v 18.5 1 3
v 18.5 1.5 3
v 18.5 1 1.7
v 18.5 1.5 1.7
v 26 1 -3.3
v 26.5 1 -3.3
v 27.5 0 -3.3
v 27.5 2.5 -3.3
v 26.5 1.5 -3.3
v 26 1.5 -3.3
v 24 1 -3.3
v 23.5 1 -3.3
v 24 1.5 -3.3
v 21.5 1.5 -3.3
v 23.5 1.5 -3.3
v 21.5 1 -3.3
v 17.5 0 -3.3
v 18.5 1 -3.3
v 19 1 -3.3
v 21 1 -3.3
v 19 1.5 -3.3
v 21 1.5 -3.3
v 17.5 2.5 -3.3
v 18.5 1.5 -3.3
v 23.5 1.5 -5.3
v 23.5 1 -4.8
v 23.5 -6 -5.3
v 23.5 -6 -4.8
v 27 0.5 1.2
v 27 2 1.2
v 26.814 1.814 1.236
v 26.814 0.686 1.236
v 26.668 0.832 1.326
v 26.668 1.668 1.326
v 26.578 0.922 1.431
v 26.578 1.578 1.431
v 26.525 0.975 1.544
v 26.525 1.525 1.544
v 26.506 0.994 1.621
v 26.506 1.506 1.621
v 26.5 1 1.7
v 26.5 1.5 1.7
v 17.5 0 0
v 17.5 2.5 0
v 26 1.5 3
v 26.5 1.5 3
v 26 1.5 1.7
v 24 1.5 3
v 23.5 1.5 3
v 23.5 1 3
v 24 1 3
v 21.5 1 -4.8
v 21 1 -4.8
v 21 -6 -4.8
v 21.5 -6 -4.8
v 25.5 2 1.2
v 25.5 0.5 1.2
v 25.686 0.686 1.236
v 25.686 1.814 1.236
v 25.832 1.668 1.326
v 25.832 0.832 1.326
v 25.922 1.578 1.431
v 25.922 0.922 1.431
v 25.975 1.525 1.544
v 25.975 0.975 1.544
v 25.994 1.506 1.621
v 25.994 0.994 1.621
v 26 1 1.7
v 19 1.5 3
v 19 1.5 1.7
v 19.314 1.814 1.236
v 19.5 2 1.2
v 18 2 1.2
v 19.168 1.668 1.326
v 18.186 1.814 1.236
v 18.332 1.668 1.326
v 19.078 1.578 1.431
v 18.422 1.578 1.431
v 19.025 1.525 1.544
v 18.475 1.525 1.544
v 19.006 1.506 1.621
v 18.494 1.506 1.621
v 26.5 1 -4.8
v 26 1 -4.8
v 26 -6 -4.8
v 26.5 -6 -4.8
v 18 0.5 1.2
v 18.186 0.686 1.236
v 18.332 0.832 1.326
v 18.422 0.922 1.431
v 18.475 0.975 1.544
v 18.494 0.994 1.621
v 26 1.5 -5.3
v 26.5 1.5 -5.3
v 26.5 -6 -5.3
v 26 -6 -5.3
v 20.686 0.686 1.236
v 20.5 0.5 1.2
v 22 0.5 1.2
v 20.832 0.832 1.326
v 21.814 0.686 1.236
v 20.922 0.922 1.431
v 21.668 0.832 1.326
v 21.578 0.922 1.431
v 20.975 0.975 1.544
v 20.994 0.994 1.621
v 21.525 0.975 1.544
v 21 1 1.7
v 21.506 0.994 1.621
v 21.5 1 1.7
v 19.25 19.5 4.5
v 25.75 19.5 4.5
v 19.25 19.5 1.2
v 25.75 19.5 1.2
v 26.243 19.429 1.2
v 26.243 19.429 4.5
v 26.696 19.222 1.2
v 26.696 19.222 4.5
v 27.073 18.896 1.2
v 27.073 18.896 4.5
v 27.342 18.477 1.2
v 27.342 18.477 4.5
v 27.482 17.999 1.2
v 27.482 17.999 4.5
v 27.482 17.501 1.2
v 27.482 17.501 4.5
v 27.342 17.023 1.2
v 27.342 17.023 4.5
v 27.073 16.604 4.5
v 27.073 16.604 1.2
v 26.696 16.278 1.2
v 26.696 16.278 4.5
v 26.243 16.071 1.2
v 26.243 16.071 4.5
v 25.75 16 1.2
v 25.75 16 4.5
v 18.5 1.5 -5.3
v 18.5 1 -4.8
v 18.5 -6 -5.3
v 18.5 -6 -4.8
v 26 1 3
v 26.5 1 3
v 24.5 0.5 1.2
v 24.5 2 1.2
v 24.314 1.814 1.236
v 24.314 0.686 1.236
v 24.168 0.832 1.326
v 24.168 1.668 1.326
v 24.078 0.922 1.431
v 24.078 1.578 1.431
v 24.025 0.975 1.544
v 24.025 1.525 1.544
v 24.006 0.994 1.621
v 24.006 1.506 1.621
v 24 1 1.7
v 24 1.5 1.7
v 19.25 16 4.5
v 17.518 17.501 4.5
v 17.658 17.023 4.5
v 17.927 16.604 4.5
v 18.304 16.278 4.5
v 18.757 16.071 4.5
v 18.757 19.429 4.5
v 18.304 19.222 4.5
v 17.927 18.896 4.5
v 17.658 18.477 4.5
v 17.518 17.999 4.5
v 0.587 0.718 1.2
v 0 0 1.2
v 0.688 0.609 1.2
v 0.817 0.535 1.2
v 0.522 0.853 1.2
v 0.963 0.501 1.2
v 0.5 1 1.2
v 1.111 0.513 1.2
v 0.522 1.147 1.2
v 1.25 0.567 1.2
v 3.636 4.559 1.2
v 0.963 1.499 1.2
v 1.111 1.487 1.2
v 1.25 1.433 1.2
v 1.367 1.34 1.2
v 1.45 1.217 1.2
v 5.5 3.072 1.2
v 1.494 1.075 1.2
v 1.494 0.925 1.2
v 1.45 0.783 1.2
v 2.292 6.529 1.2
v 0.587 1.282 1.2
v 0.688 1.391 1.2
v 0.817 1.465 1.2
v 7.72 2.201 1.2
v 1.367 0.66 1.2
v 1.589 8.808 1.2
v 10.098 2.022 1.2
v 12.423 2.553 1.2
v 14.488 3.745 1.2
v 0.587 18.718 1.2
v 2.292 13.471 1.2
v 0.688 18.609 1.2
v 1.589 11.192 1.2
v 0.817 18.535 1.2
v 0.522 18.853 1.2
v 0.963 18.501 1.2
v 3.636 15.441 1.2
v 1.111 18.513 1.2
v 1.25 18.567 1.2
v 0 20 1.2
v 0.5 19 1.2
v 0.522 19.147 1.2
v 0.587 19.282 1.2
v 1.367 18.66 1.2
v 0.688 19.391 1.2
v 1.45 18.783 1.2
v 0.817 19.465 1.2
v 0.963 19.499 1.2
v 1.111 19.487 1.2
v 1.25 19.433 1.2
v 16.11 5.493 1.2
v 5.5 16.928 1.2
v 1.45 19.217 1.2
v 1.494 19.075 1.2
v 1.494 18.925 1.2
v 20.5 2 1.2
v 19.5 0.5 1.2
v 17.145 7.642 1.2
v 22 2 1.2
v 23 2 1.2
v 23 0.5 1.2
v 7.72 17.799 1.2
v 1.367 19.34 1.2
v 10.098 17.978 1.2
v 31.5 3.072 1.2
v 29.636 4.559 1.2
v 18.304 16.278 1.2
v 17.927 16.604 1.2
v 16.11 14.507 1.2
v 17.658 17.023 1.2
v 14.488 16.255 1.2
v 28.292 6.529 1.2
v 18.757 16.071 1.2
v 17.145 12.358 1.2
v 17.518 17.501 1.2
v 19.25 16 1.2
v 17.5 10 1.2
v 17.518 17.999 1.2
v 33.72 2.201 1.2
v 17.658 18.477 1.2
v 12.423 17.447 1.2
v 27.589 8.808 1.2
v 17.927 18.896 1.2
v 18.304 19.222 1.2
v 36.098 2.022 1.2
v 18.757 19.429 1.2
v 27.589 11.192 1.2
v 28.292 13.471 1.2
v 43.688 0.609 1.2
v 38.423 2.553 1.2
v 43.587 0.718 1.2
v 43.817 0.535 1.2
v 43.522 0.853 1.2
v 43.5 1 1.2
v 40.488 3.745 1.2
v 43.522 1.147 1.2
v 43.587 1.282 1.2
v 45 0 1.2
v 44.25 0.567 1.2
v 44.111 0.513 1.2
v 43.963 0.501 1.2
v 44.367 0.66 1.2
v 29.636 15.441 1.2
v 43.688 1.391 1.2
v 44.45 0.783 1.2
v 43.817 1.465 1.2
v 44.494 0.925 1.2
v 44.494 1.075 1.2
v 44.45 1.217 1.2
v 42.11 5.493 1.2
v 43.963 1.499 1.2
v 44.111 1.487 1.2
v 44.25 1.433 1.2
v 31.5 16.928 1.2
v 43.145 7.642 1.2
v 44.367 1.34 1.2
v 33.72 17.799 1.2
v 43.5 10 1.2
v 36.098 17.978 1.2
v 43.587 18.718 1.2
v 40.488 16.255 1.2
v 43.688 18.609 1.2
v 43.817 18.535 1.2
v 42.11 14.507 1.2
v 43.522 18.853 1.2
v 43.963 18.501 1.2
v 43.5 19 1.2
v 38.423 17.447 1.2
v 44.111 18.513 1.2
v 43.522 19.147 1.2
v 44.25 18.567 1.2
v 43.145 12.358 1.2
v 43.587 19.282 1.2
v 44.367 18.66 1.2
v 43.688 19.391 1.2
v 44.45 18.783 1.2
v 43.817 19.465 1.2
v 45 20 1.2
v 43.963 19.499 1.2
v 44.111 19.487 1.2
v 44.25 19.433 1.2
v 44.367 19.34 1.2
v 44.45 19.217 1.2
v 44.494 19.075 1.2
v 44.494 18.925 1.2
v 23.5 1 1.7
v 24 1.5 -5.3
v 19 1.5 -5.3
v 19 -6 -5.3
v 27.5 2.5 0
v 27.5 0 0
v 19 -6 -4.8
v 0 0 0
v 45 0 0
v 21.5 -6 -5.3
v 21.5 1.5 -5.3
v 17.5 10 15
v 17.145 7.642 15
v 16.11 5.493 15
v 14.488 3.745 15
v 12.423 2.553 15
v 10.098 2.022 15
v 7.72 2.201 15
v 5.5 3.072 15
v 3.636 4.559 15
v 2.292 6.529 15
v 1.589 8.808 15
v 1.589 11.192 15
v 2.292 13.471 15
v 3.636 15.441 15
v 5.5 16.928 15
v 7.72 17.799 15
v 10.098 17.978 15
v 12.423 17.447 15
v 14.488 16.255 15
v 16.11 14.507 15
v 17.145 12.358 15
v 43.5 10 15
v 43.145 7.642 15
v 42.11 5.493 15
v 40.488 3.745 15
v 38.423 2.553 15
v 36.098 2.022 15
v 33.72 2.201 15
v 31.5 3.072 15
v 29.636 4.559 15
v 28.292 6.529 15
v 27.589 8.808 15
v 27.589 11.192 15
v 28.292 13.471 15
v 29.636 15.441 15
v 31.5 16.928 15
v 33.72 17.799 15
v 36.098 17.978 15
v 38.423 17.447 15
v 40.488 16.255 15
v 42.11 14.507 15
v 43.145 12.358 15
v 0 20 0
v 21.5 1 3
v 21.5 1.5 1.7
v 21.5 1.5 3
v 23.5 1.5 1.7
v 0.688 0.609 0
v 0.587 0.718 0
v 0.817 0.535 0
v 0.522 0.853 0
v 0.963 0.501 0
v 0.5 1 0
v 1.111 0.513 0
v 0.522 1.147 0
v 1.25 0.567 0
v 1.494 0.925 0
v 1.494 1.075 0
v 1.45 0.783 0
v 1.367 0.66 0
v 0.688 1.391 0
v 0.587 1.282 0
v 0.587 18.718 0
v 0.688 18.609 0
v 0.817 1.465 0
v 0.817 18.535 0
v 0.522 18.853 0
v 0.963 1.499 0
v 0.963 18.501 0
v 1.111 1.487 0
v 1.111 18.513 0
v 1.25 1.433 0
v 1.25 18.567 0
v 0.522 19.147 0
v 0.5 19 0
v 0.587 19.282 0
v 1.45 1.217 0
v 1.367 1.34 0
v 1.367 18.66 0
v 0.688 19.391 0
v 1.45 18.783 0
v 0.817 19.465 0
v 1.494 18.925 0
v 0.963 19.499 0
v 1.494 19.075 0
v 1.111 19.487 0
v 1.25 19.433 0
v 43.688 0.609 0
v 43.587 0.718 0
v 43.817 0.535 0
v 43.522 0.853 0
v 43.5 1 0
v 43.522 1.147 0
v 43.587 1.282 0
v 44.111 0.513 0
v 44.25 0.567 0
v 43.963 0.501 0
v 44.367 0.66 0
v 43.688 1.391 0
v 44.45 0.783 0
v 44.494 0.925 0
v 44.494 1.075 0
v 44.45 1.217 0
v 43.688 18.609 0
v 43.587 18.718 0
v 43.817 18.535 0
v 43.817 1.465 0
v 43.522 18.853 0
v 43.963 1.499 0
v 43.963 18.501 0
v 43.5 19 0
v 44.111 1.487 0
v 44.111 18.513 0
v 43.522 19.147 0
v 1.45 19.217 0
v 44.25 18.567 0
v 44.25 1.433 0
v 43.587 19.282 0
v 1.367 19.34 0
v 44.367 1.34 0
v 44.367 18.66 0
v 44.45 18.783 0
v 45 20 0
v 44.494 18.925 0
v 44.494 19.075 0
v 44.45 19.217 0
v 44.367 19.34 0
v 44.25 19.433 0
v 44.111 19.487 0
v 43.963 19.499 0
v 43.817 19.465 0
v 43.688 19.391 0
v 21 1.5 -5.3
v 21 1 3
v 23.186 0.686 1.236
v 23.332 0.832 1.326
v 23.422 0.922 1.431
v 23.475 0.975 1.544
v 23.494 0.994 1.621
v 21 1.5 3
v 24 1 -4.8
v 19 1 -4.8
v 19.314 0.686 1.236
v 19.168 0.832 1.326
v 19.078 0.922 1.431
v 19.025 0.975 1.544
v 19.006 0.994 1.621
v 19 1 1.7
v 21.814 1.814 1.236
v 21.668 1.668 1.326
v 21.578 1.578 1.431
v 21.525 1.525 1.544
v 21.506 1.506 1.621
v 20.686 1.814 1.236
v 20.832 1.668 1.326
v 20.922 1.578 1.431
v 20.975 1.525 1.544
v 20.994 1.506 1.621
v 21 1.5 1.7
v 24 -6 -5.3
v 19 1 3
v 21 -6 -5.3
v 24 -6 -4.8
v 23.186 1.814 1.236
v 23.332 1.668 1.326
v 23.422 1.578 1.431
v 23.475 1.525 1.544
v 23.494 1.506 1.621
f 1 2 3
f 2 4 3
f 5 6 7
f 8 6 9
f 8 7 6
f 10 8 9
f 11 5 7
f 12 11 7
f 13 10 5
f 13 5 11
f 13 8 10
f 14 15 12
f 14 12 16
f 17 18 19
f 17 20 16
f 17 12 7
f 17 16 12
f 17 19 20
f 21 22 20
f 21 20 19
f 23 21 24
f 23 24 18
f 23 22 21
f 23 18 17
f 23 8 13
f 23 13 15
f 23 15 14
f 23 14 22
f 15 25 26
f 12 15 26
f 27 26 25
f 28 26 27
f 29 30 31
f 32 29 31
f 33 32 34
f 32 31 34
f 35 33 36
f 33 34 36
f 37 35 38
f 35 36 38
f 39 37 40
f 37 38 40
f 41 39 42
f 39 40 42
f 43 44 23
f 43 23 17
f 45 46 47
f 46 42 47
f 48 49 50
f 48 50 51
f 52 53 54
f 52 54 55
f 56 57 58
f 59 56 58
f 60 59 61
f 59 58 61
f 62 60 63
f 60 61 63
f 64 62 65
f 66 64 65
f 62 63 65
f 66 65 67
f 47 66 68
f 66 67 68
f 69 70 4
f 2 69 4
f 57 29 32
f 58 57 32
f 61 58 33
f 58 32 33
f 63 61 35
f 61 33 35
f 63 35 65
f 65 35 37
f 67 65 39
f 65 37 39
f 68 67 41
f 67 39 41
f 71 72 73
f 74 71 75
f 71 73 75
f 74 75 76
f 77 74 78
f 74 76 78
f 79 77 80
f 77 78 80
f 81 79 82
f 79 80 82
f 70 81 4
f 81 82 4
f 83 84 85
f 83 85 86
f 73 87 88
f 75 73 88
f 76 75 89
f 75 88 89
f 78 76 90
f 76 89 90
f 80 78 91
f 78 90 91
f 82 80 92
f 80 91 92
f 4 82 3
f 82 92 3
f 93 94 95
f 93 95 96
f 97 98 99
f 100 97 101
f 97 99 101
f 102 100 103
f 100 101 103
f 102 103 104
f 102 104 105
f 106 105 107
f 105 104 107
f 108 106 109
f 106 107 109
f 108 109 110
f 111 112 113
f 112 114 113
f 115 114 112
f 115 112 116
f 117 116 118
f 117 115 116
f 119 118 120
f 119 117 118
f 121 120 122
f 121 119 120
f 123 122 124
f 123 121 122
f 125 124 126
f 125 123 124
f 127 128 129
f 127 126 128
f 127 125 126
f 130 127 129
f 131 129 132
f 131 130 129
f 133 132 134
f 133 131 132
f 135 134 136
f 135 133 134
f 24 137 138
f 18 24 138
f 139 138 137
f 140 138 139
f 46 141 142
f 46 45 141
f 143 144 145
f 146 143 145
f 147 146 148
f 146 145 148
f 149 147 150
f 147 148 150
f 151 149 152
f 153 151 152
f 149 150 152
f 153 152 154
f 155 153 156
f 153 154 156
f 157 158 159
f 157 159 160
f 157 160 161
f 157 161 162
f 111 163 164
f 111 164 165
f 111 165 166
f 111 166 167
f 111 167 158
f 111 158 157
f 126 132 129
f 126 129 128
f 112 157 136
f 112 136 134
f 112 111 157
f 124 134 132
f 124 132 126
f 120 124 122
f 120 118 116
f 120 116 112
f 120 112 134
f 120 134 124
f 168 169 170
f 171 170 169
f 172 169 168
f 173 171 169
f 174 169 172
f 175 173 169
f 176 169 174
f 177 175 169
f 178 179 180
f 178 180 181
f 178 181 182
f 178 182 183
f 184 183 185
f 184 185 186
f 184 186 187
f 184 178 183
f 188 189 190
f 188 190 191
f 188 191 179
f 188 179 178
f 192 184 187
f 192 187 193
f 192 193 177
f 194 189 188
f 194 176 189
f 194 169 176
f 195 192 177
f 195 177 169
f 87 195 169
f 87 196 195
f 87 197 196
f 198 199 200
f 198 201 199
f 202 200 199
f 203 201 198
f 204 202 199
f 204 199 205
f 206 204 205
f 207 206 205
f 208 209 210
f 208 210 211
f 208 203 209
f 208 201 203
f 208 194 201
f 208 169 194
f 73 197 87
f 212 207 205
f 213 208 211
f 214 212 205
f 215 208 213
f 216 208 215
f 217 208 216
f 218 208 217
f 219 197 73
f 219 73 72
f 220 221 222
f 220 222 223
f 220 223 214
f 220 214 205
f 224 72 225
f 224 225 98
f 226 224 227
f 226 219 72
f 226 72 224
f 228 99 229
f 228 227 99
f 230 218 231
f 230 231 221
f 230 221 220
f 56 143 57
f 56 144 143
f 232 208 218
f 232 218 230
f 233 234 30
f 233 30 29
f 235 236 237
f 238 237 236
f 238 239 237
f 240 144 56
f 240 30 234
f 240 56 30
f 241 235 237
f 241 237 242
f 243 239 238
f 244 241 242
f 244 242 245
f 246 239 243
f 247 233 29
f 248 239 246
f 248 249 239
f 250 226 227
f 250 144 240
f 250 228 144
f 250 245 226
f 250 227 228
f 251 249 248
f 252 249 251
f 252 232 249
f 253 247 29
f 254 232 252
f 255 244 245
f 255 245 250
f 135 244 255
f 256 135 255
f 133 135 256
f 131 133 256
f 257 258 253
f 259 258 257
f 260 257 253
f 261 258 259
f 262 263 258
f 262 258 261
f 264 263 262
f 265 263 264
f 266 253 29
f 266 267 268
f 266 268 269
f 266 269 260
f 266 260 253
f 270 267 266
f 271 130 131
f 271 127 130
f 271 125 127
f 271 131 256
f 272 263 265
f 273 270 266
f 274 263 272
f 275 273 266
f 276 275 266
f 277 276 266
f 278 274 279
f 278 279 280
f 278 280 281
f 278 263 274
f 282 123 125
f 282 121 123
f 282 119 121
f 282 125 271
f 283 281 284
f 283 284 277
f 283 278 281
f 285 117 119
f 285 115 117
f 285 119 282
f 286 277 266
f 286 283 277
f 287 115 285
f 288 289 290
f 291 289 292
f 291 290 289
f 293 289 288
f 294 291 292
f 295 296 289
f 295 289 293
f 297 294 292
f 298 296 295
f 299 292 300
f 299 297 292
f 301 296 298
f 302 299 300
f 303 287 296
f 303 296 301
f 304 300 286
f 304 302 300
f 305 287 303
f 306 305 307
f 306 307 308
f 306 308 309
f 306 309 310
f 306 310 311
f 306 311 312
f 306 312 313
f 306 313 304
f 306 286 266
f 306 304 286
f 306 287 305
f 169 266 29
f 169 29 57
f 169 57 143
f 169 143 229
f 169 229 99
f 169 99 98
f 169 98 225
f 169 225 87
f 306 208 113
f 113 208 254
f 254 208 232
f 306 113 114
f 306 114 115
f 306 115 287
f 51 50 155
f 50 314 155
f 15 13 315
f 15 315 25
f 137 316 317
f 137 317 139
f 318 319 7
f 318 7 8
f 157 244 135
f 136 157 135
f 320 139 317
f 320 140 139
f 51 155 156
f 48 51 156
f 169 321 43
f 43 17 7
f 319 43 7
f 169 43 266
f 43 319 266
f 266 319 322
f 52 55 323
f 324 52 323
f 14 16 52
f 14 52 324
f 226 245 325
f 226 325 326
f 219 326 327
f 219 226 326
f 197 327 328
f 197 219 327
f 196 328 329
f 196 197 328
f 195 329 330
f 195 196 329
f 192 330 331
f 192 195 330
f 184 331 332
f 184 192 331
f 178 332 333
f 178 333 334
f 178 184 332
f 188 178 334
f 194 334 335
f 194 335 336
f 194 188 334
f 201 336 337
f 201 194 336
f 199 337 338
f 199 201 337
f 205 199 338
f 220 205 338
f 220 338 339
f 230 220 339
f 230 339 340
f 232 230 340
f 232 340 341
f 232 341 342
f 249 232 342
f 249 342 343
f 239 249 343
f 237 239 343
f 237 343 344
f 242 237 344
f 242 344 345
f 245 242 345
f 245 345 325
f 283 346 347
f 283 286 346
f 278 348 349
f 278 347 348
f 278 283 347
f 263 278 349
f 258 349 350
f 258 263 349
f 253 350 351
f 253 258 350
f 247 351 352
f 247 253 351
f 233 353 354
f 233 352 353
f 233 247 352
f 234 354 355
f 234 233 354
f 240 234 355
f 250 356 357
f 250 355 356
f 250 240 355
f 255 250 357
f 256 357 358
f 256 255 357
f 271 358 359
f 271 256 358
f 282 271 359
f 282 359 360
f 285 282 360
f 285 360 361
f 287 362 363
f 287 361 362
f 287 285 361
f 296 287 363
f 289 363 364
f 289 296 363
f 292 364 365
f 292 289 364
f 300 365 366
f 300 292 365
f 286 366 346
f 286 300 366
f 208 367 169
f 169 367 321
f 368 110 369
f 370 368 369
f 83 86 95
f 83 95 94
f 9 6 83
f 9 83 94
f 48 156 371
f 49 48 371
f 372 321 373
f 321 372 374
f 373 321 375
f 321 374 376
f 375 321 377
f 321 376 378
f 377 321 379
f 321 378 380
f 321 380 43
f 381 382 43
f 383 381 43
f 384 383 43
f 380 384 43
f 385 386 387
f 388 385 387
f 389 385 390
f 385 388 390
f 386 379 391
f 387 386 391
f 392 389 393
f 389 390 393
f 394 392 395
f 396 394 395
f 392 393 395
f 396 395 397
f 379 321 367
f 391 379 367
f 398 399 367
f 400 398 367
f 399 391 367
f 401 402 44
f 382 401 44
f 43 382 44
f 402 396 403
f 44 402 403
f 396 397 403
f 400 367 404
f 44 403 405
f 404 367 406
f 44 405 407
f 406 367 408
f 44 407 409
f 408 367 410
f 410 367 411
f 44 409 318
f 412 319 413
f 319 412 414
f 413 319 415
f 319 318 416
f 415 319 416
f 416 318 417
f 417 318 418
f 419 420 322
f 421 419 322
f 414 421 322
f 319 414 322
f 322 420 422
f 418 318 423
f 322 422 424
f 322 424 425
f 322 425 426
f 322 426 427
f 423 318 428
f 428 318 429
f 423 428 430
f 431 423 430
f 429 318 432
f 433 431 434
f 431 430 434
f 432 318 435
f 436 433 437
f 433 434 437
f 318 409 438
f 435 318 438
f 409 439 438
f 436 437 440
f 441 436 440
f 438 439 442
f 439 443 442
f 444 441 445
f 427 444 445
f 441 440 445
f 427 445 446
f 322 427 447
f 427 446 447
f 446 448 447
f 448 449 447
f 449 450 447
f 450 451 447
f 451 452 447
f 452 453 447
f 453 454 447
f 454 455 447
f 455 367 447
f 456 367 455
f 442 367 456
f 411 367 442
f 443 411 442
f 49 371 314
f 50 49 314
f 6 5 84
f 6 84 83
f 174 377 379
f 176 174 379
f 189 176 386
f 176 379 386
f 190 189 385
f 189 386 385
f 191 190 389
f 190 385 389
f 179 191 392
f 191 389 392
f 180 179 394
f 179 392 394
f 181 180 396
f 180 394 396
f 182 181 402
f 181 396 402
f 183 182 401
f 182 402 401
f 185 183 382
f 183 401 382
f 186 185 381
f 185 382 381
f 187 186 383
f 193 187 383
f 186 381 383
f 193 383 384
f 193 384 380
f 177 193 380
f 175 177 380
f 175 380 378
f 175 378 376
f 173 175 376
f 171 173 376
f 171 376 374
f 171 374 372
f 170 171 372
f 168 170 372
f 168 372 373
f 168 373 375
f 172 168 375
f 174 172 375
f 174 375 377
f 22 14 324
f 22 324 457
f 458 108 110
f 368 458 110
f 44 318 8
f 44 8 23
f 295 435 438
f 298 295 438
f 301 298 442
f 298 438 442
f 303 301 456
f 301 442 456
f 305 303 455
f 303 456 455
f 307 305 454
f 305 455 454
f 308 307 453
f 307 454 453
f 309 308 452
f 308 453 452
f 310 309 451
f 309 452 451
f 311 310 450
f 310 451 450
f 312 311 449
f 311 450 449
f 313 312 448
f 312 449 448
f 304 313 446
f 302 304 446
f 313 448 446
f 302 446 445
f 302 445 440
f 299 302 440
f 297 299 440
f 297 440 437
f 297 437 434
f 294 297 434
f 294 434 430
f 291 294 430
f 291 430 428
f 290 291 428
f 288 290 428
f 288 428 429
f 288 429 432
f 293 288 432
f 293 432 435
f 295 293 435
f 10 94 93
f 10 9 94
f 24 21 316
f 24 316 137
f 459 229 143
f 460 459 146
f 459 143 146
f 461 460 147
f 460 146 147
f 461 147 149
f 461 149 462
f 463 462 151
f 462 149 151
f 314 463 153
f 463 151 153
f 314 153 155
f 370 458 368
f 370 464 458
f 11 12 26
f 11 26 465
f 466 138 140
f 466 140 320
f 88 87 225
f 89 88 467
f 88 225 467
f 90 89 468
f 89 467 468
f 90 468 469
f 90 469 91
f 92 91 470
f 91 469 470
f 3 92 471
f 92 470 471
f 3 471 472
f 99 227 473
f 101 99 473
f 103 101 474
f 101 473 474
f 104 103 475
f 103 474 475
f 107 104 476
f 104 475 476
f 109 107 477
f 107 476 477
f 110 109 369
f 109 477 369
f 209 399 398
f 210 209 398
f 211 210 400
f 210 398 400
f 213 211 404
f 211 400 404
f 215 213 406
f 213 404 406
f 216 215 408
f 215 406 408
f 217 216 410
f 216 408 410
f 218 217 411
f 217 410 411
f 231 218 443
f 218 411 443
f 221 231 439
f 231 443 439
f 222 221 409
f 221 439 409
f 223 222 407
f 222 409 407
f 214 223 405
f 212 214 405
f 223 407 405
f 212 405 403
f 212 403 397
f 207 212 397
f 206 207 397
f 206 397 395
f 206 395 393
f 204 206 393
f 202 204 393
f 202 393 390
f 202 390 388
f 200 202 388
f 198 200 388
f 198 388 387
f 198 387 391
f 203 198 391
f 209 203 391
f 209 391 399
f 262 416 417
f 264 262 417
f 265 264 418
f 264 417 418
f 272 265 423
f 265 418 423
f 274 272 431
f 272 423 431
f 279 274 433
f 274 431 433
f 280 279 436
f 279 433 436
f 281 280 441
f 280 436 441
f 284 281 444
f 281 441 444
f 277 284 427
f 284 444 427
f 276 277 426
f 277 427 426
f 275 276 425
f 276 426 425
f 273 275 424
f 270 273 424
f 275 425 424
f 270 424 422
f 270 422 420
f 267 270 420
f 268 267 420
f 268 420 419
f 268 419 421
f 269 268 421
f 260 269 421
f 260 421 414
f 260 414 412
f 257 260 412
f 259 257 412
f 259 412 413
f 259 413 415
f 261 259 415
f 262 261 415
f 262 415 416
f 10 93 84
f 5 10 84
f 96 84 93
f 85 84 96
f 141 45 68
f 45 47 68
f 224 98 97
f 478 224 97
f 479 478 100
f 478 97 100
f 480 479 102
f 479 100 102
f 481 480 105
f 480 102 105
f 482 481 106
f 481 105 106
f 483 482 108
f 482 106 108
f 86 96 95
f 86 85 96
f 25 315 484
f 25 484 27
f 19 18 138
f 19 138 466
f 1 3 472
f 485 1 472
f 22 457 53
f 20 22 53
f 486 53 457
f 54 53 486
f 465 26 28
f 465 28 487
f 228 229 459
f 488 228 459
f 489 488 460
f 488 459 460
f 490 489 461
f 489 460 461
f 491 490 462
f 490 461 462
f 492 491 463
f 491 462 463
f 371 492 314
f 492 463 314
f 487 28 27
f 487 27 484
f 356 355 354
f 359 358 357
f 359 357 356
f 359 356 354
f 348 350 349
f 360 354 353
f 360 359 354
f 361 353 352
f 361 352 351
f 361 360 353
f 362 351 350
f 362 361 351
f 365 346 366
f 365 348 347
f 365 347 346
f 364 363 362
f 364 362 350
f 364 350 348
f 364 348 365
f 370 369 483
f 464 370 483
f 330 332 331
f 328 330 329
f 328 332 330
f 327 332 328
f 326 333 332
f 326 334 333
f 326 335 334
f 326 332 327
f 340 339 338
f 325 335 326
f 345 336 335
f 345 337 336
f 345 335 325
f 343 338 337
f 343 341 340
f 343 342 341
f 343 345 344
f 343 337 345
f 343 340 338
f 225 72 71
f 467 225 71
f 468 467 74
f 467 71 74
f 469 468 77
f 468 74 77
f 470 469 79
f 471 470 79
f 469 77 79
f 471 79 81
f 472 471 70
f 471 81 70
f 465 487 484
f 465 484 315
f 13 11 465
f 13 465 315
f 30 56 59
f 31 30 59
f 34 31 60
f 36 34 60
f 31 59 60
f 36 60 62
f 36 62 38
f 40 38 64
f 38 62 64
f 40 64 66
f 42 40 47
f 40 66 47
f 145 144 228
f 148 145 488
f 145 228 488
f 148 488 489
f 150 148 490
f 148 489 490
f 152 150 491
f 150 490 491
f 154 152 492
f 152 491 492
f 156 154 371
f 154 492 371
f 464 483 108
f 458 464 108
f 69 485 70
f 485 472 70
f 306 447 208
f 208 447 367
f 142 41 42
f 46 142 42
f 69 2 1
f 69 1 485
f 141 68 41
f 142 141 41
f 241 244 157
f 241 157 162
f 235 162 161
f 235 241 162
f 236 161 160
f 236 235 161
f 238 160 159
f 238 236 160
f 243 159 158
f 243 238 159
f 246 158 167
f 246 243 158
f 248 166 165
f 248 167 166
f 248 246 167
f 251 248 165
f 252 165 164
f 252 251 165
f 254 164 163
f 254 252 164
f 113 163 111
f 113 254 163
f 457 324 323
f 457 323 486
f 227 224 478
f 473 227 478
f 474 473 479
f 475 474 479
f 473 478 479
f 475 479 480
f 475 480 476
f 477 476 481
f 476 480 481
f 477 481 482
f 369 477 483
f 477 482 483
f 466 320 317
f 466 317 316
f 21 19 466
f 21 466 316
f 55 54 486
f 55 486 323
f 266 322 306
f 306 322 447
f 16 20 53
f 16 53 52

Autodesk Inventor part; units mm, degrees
ref_plane "YZ Plane" through (0, 0, 0) normal (1, 0, 0) x (0, 1, 0)
ref_plane "XZ Plane" through (0, 0, 0) normal (0, 1, 0) x (-1, 0, 0)
ref_plane "XY Plane" through (0, 0, 0) normal (0, 0, 1) x (1, 0, 0)
sketch "Эскиз1" plane through (0, 0, 0) normal (0, 0, 1) x (1, 0, 0)
  line L0 (0, 0) -> (45, 0)
  line L1 (45, 0) -> (45, 20)
  line L2 (45, 20) -> (0, 20)
  line L3 (0, 20) -> (0, 0)
  dimension "d0" = 45
  dimension "d1" = 20
extrude "Выдавливание1" add sketch "Эскиз1" along normal blind 1.2
sketch "Эскиз2" plane through (0, 0, 1.2) normal (0, 0, 1) x (1, 0, 0)
  line L0 (0, 20) -> (0, 0) projected
  line L1 (0, 10) -> (1.5, 10)
  line L2 (1.5, 10) -> (9.5, 10)
  circle A0 centre (9.5, 10) radius 8
  line L3 (45, 20) -> (0, 20) projected
  line L4 (22.5, 20) -> (22.5, 0)
  line L5 (0, 0) -> (45, 0) projected
  circle A1 centre (35.5, 10) radius 8
  dimension "d5" = 16
  dimension "d4" = 1.5
extrude "Выдавливание2" add sketch "Эскиз2" along normal blind 13.8 contours A0 | A1
sketch "Эскиз3" plane through (0, 0, 1.2) normal (0, 0, 1) x (1, 0, 0)
  line L0 (45, 20) -> (0, 20) projected
  line L1 (22.5, 20) -> (22.5, 19.5)
  line L2 (27.5, 17.75) -> (17.5, 17.75) construction
  line L3 (25.75, 19.5) -> (19.25, 19.5)
  line L4 (19.25, 16) -> (25.75, 16)
  arc A0 (25.75, 16) -> (25.75, 19.5) centre (25.75, 17.75) ccw
  arc A1 (19.25, 19.5) -> (19.25, 16) centre (19.25, 17.75) ccw
  point P0 (0, 0)
  point P1 (22.5, 17.75)
  dimension "d8" = 0.5
  dimension "d9" = 10
  dimension "d10" = 3.5
extrude "Выдавливание3" add sketch "Эскиз3" along normal blind 3.3
sketch "Эскиз8" plane through (0, 0, 0) normal (0, 0, -1) x (-1, 0, 0)
  line L0 (-45, 0) -> (-45, 20) projected
  line L1 (-45, 20) -> (-44, 20)
  line L2 (-45, 20) -> (0, 20) projected
  line L3 (-44, 20) -> (-44, 19)
  circle A0 centre (-44, 19) radius 0.5
  line L4 (-45, 10) -> (0, 10)
  line L5 (0, 20) -> (0, 0) projected
  line L6 (-22.5, 20) -> (-22.5, 0)
  line L7 (0, 0) -> (-45, 0) projected
  circle A1 centre (-44, 1) radius 0.5
  circle A2 centre (-1, 19) radius 0.5
  circle A3 centre (-1, 1) radius 0.5
  dimension "d41" = 1
  dimension "d42" = 1
  dimension "d43" = 1
extrude "Выдавливание8" cut sketch "Эскиз8" against normal through all contours A0 | A1 | A2 | A3
sketch "Эскиз4" plane through (0, 0, 0) normal (0, 0, -1) x (-1, 0, 0)
  line L0 (-27.5, 2.5) -> (-17.5, 2.5)
  line L1 (-17.5, 2.5) -> (-17.5, 0)
  line L2 (-17.5, 0) -> (-27.5, 0)
  line L3 (-27.5, 0) -> (-27.5, 2.5)
  line L4 (-27.5, 2.5) -> (-17.5, 0) construction
  line L5 (-17.5, 2.5) -> (-27.5, 0) construction
  line L6 (0, 0) -> (-45, 0) projected
  point P0 (-22.5, 1.25)
  point P1 (-22.5, 0)
  dimension "d13" = 10
  dimension "d14" = 2.5
extrude "Выдавливание4" add sketch "Эскиз4" along normal blind 3.3
sketch "Эскиз5" plane through (0, 0, -3.3) normal (0, 0, -1) x (-1, 0, 0)
  line L0 (-26.5, 1.5) -> (-26, 1.5)
  line L1 (-26, 1.5) -> (-26, 1)
  line L2 (-26, 1) -> (-26.5, 1)
  line L3 (-26.5, 1) -> (-26.5, 1.5)
  line L4 (-26.5, 1.25) -> (-27.5, 1.25)
  line L5 (-27.5, 2.5) -> (-27.5, 0) projected
  line L6 (-24, 1.5) -> (-23.5, 1.5)
  line L7 (-23.5, 1.5) -> (-23.5, 1)
  line L8 (-23.5, 1) -> (-24, 1)
  line L9 (-24, 1) -> (-24, 1.5)
  line L10 (-21.5, 1.5) -> (-21, 1.5)
  line L11 (-21, 1.5) -> (-21, 1)
  line L12 (-21, 1) -> (-21.5, 1)
  line L13 (-21.5, 1) -> (-21.5, 1.5)
  line L14 (-19, 1.5) -> (-18.5, 1.5)
  line L15 (-18.5, 1.5) -> (-18.5, 1)
  line L16 (-18.5, 1) -> (-19, 1)
  line L17 (-19, 1) -> (-19, 1.5)
  point P0 (0, 0)
  point P1 (-24, 1.25)
  point P2 (-21.5, 1.25)
  point P3 (-19, 1.25)
  dimension "d17" = 0.5
  dimension "d18" = 0.5
  dimension "d19" = 1
  dimension "d22" = 2.5
extrude "Выдавливание5" add sketch "Эскиз5" along normal blind 2
sketch "Эскиз6" plane through (26, 1, -3.3) normal (0, -1, 0) x (1, 0, 0)
  line L0 (0.5, -2) -> (0, -2) projected
  line L1 (0, 0) -> (0, -2) projected
  line L2 (0.5, -2) -> (0, -2)
  line L3 (0, -2) -> (0, -1.5)
  line L4 (0, -1.5) -> (0.5, -1.5)
  line L5 (0.5, -1.5) -> (0.5, -2)
  line L6 (-2, -2) -> (-2.5, -2)
  line L7 (-2.5, -2) -> (-2.5, -1.5)
  line L8 (-2.5, -1.5) -> (-2, -1.5)
  line L9 (-2, -1.5) -> (-2, -2)
  line L10 (-4.5, -2) -> (-5, -2)
  line L11 (-5, -2) -> (-5, -1.5)
  line L12 (-5, -1.5) -> (-4.5, -1.5)
  line L13 (-4.5, -1.5) -> (-4.5, -2)
  line L14 (-7, -2) -> (-7.5, -2)
  line L15 (-7.5, -2) -> (-7.5, -1.5)
  line L16 (-7.5, -1.5) -> (-7, -1.5)
  line L17 (-7, -1.5) -> (-7, -2)
  point P0 (-26, 3.3)
  dimension "d31" = 2.5
extrude "Выдавливание6" add sketch "Эскиз6" along normal blind 7
sketch "Эскиз7" plane through (0, 0, 1.2) normal (0, 0, 1) x (1, 0, 0)
  line L0 (26.5, 1.5) -> (26, 1.5) projected
  line L1 (26.5, 1) -> (26.5, 1.5) projected
  line L2 (26, 1.5) -> (26, 1) projected
  line L3 (26, 1) -> (26.5, 1) projected
  line L4 (21, 1) -> (21.5, 1) projected
  line L5 (21.5, 1) -> (21.5, 1.5) projected
  line L6 (21.5, 1.5) -> (21, 1.5) projected
  line L7 (21, 1.5) -> (21, 1) projected
  line L8 (26.5, 1.5) -> (26, 1.5) projected
  line L9 (26, 1.5) -> (26, 1) projected
  line L10 (26, 1) -> (26.5, 1) projected
  line L11 (26.5, 1) -> (26.5, 1.5) projected
  line L12 (23.5, 1) -> (24, 1) projected
  line L13 (24, 1) -> (24, 1.5) projected
  line L14 (24, 1.5) -> (23.5, 1.5) projected
  line L15 (23.5, 1.5) -> (23.5, 1) projected
  line L16 (18.5, 1) -> (19, 1) projected
  line L17 (19, 1) -> (19, 1.5) projected
  line L18 (19, 1.5) -> (18.5, 1.5) projected
  line L19 (18.5, 1.5) -> (18.5, 1) projected
  line L20 (17.5, 0) -> (17.5, 2.5) projected
  line L21 (17.5, 2.5) -> (27.5, 2.5) projected
  line L22 (27.5, 2.5) -> (27.5, 0) projected
  line L23 (27.5, 0) -> (17.5, 0) projected
  point P0 (0, 0)
extrude "Выдавливание7" add sketch "Эскиз7" along normal blind 1.8 contours L1 L3 L2 L0 | L7 L6 L5 L4 | L15 L14 L13 L12 | L19 L18 L17 L16
fillet "Сопряжение1" radius 0.5 16 edges at (21.25, 1.5, 1.2) (21.25, 1, 1.2) (21.5, 1.25, 1.2) (21, 1.25, 1.2) (18.75, 1, 1.2) (18.5, 1.25, 1.2) (19, 1.25, 1.2) (18.75, 1.5, 1.2) (23.75, 1, 1.2) (24, 1.25, 1.2) (23.5, 1.25, 1.2) (23.75, 1.5, 1.2) (26.25, 1.5, 1.2) (26, 1.25, 1.2) (26.25, 1, 1.2) (26.5, 1.25, 1.2)
properties part number "Ultrasonic HC-SRO4"
